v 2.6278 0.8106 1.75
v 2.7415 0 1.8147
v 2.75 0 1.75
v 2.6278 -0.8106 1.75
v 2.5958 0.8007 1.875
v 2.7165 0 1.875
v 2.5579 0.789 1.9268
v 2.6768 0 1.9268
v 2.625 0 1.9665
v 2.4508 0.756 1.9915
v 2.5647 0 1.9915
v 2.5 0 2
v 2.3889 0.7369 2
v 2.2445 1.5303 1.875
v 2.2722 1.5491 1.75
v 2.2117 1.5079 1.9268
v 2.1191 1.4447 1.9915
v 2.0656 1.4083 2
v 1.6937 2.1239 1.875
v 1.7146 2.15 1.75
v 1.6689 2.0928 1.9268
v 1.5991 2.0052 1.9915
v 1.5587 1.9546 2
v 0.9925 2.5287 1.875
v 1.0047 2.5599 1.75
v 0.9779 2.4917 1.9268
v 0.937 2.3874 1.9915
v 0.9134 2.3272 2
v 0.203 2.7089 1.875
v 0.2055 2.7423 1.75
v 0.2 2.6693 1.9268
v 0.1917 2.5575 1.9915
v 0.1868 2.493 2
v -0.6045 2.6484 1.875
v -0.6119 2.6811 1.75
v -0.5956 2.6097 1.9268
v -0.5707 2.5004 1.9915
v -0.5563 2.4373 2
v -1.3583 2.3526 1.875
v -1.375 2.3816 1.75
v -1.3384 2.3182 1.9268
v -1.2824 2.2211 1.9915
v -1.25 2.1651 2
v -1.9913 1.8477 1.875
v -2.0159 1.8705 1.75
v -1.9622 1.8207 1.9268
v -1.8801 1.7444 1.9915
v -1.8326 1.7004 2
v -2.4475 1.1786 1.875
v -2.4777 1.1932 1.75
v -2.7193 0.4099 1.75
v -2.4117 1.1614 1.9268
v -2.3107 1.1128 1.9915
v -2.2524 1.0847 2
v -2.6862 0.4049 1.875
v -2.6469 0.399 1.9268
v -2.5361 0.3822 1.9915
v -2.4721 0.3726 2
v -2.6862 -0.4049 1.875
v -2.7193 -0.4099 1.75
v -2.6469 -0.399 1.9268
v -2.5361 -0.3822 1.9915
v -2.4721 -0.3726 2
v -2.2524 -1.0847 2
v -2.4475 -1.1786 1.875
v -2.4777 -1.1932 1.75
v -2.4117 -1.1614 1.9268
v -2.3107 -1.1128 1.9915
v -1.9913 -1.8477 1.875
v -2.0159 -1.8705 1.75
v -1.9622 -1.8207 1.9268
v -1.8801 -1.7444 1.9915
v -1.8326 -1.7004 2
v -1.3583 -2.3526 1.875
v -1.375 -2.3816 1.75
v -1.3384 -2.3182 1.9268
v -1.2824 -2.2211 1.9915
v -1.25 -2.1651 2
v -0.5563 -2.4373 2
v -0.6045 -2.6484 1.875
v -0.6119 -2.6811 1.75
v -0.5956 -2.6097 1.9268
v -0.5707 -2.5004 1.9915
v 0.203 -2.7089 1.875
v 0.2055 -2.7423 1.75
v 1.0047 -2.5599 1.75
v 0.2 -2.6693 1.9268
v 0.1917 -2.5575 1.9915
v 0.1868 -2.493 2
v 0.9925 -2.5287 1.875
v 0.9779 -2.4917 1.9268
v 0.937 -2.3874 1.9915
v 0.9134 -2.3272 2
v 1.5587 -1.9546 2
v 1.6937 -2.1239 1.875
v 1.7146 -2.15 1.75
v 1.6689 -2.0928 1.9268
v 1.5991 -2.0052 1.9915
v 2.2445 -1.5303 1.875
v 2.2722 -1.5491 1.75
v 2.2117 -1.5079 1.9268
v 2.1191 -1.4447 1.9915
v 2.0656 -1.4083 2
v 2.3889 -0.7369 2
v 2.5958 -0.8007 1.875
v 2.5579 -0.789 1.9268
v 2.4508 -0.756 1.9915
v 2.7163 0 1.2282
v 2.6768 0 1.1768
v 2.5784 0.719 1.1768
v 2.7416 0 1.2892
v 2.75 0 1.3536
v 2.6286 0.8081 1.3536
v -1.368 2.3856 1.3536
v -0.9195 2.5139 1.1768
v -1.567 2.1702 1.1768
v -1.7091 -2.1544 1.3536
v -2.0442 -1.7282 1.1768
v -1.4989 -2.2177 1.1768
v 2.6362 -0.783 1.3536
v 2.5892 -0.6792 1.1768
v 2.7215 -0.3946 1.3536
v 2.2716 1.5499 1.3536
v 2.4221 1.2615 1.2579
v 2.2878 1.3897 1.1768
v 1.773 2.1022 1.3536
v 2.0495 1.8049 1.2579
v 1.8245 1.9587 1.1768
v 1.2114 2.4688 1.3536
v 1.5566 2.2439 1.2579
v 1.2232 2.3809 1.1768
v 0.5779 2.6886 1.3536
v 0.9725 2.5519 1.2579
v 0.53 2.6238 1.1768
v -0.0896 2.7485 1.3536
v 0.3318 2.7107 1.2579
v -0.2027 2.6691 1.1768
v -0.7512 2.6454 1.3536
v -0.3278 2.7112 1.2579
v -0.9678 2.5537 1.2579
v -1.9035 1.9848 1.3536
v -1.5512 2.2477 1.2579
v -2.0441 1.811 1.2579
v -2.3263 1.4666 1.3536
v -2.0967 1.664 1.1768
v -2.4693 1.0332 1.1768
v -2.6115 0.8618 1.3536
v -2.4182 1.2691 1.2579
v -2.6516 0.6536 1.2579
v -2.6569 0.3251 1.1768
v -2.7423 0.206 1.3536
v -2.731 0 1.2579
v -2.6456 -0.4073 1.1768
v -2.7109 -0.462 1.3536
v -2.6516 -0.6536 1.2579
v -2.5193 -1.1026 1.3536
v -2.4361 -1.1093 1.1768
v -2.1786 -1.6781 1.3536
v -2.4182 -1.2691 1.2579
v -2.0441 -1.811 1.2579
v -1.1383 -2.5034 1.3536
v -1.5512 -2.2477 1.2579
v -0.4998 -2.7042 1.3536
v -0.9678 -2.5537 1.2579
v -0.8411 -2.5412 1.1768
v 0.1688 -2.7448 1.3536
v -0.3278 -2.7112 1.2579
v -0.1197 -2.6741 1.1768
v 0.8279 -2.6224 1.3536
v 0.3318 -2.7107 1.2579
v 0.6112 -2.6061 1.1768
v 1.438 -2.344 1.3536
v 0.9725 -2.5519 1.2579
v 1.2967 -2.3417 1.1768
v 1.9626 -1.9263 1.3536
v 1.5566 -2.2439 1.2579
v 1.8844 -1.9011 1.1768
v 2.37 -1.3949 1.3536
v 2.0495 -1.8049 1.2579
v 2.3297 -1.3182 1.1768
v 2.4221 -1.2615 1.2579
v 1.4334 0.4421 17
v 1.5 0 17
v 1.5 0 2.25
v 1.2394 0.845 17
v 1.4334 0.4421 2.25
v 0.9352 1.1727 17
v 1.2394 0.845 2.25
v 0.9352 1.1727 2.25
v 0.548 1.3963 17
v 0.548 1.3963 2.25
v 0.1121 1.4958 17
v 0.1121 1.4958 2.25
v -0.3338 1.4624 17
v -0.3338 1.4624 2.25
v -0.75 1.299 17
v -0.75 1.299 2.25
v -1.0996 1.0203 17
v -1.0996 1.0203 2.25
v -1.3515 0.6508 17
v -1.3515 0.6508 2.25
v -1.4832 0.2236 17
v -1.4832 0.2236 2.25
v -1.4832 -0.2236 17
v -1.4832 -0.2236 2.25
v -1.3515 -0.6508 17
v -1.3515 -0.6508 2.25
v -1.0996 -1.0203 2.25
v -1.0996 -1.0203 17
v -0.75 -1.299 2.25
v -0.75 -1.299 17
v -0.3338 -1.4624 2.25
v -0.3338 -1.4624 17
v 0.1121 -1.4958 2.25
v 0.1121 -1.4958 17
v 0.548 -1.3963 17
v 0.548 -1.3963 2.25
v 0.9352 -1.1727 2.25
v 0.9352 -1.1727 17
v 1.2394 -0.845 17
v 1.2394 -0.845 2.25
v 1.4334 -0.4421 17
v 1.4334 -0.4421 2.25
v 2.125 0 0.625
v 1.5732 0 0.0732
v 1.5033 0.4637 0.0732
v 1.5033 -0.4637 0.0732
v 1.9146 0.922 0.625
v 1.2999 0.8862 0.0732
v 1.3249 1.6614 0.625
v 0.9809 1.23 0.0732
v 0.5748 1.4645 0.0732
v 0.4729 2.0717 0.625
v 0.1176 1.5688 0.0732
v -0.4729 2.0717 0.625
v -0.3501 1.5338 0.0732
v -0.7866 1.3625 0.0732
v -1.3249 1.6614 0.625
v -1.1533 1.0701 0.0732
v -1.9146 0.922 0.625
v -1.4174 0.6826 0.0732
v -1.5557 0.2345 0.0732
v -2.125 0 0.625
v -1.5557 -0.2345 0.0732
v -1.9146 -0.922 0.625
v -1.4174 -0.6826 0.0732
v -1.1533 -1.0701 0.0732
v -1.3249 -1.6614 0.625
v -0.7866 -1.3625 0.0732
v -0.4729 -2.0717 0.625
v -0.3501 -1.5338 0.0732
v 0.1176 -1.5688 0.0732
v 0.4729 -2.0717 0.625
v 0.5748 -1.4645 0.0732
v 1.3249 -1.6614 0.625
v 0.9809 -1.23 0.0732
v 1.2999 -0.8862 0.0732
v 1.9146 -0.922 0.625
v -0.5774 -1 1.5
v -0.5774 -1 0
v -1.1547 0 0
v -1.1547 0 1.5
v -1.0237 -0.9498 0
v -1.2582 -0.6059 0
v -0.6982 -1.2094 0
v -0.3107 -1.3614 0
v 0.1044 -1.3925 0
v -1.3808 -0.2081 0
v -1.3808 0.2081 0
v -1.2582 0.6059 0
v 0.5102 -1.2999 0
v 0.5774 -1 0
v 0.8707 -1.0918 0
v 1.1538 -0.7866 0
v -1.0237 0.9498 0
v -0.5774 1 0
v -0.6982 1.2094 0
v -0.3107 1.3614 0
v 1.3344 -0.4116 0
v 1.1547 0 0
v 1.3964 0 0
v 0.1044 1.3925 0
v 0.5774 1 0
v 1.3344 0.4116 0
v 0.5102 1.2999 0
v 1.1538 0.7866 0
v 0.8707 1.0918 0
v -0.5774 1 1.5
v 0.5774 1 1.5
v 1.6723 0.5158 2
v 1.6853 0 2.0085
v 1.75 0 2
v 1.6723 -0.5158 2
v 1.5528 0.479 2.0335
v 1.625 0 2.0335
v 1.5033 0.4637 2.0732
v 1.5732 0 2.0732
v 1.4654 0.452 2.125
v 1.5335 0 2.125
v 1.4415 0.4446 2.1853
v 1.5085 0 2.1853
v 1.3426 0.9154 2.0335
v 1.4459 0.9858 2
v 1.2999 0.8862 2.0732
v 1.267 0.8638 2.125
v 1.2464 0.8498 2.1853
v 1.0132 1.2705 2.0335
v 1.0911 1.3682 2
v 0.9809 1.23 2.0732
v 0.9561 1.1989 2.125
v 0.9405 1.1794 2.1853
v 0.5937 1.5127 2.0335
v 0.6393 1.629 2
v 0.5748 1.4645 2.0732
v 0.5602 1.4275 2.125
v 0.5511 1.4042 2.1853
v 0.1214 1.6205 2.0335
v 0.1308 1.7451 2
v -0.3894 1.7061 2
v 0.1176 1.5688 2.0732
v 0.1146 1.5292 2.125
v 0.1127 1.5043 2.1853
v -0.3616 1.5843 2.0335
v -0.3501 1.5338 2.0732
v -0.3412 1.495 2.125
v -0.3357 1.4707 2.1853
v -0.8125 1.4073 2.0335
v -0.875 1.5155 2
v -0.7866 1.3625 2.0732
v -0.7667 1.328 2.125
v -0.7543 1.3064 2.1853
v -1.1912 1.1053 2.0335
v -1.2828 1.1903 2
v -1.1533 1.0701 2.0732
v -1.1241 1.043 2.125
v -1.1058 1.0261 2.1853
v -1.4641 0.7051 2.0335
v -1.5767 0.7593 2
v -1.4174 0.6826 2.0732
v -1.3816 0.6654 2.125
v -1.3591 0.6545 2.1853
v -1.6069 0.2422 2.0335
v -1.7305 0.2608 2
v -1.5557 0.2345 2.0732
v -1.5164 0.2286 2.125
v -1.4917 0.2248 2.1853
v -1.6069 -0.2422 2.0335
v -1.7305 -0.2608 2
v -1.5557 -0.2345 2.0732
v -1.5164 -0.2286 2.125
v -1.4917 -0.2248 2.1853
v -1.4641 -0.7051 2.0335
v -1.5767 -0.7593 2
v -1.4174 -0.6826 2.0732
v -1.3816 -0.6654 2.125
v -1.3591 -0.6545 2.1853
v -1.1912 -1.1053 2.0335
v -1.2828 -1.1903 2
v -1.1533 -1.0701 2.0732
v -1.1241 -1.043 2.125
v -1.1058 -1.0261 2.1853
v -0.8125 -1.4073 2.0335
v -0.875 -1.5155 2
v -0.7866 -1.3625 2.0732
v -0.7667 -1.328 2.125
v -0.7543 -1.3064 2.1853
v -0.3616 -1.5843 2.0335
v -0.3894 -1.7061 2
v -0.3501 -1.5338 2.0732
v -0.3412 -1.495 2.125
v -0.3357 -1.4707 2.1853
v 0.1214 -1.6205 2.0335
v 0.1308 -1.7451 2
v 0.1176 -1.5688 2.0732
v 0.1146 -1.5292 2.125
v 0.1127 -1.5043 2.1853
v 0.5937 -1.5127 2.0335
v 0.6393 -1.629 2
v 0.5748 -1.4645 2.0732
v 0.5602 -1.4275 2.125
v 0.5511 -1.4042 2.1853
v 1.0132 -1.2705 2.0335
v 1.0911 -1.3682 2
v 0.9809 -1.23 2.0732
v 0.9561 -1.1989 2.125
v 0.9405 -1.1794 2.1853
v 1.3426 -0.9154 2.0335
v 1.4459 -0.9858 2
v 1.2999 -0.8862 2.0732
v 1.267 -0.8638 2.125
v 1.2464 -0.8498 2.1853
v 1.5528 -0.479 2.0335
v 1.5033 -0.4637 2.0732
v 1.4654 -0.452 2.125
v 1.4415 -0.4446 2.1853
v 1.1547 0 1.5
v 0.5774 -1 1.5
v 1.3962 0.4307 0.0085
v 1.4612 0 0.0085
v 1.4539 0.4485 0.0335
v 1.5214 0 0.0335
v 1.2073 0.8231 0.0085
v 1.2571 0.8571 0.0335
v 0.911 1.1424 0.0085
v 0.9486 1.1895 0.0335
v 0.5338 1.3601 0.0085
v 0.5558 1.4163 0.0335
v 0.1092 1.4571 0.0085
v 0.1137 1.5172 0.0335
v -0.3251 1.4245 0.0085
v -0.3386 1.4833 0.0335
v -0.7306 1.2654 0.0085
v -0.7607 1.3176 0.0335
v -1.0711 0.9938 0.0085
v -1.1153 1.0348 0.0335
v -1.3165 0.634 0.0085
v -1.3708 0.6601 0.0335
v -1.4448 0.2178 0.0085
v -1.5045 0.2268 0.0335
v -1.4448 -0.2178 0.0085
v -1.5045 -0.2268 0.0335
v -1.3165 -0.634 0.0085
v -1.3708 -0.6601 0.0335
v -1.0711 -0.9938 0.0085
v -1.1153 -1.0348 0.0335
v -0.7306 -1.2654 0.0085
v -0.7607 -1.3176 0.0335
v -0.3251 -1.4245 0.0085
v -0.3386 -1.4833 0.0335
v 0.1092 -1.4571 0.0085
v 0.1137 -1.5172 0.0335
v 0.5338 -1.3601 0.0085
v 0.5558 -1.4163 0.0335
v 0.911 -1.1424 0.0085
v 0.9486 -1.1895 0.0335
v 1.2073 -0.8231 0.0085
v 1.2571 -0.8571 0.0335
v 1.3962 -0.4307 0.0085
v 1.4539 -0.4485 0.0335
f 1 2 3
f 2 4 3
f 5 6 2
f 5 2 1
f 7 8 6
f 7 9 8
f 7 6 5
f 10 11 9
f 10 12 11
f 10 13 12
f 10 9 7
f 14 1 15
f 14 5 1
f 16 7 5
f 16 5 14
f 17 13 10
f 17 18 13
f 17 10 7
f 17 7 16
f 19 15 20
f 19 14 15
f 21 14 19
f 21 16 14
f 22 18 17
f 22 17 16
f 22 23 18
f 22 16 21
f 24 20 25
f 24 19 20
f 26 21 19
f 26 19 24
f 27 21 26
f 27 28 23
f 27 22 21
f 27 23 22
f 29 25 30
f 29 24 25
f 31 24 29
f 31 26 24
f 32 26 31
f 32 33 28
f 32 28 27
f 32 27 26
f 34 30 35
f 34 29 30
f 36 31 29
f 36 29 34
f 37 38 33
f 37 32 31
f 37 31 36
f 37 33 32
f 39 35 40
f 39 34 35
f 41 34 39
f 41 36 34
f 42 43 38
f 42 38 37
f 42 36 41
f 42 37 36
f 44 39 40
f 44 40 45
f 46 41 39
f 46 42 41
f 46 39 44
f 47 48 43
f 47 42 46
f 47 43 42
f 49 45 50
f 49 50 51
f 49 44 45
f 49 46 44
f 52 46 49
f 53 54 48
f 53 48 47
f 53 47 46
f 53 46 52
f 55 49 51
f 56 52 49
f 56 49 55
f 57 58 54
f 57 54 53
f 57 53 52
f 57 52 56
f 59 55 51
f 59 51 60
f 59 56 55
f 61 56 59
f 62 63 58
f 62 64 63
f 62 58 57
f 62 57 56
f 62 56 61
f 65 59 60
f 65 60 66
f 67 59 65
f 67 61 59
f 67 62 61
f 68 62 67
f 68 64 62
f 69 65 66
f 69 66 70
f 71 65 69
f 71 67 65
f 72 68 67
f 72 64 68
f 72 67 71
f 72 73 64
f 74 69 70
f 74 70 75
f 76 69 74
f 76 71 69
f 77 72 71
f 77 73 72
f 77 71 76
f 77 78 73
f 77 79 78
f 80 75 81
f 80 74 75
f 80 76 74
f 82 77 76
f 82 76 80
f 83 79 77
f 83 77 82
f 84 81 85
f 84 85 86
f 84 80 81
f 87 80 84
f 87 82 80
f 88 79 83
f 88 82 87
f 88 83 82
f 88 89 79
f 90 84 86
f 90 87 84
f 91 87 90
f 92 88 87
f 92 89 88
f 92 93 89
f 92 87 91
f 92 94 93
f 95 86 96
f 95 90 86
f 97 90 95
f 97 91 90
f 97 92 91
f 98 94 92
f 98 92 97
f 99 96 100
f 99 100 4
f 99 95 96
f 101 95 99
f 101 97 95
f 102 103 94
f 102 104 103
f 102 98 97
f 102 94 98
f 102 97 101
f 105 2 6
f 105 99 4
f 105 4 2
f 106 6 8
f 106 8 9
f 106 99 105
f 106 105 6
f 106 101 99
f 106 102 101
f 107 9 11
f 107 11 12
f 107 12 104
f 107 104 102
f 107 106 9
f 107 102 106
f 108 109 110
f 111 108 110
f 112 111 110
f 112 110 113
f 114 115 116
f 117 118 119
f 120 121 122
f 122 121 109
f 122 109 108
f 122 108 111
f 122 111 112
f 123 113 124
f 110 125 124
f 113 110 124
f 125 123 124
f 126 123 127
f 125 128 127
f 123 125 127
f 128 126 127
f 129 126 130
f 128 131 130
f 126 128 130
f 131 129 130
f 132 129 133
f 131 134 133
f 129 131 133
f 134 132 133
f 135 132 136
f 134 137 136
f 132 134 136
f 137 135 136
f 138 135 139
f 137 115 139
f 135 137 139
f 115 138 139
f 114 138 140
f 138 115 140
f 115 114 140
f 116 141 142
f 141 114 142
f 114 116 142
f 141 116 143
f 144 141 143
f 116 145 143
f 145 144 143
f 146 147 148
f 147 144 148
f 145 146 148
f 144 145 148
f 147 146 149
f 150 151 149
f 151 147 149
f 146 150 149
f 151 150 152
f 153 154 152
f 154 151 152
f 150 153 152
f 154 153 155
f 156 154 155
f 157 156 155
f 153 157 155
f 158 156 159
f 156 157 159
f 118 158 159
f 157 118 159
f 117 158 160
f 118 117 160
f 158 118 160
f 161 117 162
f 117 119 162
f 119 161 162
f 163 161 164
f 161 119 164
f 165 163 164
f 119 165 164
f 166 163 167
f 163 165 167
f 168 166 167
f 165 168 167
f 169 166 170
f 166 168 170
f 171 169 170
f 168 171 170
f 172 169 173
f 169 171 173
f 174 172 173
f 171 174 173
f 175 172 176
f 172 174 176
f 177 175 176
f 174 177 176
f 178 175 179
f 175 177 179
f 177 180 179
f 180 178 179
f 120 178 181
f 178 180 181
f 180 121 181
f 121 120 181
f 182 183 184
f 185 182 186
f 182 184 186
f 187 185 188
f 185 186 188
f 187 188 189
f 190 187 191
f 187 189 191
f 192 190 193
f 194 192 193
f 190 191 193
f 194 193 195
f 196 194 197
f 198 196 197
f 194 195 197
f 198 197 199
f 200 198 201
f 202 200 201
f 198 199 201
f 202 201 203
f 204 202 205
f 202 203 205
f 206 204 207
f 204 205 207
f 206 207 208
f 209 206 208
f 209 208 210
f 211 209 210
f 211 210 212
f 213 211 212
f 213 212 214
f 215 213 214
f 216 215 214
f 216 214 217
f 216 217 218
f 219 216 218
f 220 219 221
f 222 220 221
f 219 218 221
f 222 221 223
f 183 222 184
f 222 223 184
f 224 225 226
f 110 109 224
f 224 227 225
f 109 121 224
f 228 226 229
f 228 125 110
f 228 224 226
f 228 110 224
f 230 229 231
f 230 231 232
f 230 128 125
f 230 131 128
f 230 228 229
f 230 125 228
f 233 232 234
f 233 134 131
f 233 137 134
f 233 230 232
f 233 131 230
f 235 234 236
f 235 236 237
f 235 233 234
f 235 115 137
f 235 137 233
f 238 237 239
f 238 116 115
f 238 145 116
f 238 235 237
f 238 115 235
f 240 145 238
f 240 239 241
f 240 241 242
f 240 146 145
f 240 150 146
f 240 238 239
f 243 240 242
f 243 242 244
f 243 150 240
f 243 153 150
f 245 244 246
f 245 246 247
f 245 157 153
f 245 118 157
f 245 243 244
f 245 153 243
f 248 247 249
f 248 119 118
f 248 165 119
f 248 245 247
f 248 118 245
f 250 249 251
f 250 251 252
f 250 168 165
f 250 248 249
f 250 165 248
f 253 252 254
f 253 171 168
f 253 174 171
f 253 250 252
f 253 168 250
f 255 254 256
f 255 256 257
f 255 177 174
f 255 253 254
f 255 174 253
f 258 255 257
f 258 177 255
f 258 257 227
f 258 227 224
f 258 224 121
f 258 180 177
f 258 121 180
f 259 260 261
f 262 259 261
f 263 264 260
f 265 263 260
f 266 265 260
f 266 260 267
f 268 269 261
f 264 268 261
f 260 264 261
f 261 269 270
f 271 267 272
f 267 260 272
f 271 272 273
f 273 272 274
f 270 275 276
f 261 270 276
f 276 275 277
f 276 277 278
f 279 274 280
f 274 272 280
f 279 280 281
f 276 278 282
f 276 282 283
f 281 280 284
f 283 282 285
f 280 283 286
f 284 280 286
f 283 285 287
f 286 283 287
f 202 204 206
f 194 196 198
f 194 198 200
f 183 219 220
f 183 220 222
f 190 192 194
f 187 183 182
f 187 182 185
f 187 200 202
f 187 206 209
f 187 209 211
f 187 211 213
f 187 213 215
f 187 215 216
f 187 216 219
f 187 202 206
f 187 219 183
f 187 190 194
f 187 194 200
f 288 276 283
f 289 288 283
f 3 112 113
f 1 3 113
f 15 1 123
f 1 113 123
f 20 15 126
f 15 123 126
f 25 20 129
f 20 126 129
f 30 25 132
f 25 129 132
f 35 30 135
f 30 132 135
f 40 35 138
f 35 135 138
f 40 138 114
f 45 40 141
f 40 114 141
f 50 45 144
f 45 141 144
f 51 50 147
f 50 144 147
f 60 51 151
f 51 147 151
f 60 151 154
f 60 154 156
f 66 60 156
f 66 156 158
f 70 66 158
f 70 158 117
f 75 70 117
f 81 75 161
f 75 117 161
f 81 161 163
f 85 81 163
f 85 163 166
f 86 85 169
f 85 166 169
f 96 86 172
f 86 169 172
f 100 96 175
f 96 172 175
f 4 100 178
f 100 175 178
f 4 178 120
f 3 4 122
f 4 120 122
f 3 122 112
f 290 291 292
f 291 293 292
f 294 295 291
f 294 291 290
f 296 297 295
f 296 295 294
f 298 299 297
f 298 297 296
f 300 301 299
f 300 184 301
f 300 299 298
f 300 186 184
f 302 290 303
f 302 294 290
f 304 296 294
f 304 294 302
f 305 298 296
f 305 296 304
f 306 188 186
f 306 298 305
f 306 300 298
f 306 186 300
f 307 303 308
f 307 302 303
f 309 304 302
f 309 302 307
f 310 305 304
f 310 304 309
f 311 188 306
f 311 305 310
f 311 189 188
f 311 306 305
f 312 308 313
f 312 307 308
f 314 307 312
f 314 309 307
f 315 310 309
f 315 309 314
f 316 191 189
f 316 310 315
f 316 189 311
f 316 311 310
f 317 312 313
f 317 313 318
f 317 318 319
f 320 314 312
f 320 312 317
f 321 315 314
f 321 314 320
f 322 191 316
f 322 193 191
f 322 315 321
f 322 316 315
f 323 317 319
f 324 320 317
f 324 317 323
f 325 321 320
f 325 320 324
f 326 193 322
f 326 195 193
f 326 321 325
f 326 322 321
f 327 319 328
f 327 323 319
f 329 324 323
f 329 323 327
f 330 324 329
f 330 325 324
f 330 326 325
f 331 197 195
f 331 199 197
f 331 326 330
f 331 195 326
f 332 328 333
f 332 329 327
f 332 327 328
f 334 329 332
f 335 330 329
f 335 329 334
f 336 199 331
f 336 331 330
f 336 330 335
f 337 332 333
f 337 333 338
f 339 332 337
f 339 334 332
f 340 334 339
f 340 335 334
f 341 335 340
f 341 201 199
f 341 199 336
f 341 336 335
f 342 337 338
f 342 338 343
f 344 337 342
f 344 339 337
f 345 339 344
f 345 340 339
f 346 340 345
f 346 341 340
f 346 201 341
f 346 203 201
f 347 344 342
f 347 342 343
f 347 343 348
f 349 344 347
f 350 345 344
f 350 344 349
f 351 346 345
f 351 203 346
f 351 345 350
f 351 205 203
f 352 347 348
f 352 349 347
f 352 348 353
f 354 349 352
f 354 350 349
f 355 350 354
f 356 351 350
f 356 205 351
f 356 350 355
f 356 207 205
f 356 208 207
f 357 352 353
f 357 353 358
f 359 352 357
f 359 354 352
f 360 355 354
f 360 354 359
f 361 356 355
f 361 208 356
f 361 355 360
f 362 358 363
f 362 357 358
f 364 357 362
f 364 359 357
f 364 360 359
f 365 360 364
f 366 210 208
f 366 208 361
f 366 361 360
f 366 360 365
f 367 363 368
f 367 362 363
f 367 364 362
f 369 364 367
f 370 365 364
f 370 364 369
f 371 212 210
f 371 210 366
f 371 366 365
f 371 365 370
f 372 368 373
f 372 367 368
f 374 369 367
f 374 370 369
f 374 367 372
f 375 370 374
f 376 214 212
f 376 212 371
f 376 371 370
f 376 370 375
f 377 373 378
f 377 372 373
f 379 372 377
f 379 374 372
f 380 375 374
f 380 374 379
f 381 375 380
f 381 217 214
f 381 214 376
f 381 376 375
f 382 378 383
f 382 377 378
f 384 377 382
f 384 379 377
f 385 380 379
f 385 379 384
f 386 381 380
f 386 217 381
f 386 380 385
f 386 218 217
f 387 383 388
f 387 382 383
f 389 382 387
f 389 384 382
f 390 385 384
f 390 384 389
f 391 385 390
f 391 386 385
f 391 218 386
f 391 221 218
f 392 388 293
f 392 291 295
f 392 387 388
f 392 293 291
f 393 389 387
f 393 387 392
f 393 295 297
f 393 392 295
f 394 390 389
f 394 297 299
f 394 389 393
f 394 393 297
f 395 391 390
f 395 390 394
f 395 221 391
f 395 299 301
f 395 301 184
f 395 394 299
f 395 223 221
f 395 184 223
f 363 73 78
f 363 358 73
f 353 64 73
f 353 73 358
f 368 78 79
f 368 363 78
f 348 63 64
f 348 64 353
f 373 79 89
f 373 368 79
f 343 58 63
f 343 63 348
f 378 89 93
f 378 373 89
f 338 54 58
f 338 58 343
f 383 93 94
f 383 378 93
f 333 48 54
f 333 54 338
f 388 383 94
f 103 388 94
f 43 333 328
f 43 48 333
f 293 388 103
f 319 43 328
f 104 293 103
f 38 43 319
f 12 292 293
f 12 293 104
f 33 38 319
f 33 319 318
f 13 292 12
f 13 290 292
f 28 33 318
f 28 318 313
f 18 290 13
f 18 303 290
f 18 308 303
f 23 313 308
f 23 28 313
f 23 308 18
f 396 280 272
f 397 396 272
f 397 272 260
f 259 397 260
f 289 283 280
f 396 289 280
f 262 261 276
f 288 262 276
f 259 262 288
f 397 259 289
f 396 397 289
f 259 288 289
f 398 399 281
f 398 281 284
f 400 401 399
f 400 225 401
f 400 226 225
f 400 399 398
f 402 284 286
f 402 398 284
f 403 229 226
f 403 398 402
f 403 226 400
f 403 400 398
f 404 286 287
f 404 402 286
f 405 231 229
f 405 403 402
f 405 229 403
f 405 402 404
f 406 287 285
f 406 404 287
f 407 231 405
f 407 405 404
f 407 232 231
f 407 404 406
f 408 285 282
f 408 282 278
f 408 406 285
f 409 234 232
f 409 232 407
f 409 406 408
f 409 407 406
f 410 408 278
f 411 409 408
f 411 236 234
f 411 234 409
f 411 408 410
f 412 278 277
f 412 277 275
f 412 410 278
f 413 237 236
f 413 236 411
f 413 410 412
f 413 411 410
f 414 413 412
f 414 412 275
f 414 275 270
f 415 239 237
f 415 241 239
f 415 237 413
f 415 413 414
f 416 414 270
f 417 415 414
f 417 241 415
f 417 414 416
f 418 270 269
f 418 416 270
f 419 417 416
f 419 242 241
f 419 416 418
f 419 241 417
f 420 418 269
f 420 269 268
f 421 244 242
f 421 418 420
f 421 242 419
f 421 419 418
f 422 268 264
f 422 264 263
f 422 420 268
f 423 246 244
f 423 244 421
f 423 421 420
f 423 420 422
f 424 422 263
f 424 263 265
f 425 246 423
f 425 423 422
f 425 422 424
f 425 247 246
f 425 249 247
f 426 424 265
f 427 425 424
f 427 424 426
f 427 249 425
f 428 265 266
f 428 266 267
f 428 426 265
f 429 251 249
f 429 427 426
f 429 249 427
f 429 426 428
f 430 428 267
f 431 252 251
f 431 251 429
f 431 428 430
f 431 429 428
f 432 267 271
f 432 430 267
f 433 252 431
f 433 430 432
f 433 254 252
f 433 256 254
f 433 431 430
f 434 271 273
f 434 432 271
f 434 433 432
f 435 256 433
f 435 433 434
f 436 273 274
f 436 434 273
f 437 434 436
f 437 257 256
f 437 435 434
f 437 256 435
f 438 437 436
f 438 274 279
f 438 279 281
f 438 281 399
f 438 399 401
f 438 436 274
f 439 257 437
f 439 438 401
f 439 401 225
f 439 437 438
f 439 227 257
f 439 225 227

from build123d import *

# Parameters (mm, degrees)
F1_R     = 2.75
F1_R_2   = 1.5
F2_DEPTH = 2
F3_START = 1.5
F3_DEPTH = 0.5
F4_START = 2
F4_DEPTH = 15
F5_SIZE2 = 1.25
F5_SIZE  = 1.25
F6_R     = 0.25


# Not quite as in the source:
# - a feature names something its author has since deleted; it is built from what else it names


with BuildPart() as f2:
    # F1 (on Top) → F2 (new body)
    with BuildSketch(Plane.XY):
        Circle(F1_R)
        Circle(F1_R_2, mode=Mode.SUBTRACT)
        Circle(F1_R_2)
        Polygon((-0.5773502692, -1), (-1.1547005384, 0), (-0.5773502692, 1), (0.5773502692, 1), (1.1547005384, 0), (0.5773502692, -1), align=None, mode=Mode.SUBTRACT)
    extrude(amount=F2_DEPTH)

    # F1 (on Top) → F3 (join)
    with BuildSketch(Plane.XY.offset(F3_START)):
        Polygon((-0.5773502692, 1), (-1.1547005384, 0), (-0.5773502692, -1), (0.5773502692, -1), (1.1547005384, 0), (0.5773502692, 1), align=None)
    extrude(amount=F3_DEPTH)

    # F1 (on Top) → F4 (join)
    with BuildSketch(Plane.XY.offset(F4_START)):
        Circle(F1_R_2)
        Polygon((-0.5773502692, -1), (-1.1547005384, 0), (-0.5773502692, 1), (0.5773502692, 1), (1.1547005384, 0), (0.5773502692, -1), align=None, mode=Mode.SUBTRACT)
        Polygon((-0.5773502692, 1), (-1.1547005384, 0), (-0.5773502692, -1), (0.5773502692, -1), (1.1547005384, 0), (0.5773502692, 1), align=None)
    extrude(amount=F4_DEPTH)

    # F5
    f5_edges = [f2.edges().sort_by_distance(p)[0] for p in [
        (-2.75, 0, 0),
    ]]
    chamfer(f5_edges, length=F5_SIZE, length2=F5_SIZE2)

    # F6
    f6_edges = [f2.edges().sort_by_distance(p)[0] for p in [
        (-2.75, 0, 2),
        (-1.5, 0, 2),
        (-1.5, 0, 0),
        (-2.75, 0, 1.25),
    ]]
    fillet(f6_edges, radius=F6_R)


solid = f2.part
